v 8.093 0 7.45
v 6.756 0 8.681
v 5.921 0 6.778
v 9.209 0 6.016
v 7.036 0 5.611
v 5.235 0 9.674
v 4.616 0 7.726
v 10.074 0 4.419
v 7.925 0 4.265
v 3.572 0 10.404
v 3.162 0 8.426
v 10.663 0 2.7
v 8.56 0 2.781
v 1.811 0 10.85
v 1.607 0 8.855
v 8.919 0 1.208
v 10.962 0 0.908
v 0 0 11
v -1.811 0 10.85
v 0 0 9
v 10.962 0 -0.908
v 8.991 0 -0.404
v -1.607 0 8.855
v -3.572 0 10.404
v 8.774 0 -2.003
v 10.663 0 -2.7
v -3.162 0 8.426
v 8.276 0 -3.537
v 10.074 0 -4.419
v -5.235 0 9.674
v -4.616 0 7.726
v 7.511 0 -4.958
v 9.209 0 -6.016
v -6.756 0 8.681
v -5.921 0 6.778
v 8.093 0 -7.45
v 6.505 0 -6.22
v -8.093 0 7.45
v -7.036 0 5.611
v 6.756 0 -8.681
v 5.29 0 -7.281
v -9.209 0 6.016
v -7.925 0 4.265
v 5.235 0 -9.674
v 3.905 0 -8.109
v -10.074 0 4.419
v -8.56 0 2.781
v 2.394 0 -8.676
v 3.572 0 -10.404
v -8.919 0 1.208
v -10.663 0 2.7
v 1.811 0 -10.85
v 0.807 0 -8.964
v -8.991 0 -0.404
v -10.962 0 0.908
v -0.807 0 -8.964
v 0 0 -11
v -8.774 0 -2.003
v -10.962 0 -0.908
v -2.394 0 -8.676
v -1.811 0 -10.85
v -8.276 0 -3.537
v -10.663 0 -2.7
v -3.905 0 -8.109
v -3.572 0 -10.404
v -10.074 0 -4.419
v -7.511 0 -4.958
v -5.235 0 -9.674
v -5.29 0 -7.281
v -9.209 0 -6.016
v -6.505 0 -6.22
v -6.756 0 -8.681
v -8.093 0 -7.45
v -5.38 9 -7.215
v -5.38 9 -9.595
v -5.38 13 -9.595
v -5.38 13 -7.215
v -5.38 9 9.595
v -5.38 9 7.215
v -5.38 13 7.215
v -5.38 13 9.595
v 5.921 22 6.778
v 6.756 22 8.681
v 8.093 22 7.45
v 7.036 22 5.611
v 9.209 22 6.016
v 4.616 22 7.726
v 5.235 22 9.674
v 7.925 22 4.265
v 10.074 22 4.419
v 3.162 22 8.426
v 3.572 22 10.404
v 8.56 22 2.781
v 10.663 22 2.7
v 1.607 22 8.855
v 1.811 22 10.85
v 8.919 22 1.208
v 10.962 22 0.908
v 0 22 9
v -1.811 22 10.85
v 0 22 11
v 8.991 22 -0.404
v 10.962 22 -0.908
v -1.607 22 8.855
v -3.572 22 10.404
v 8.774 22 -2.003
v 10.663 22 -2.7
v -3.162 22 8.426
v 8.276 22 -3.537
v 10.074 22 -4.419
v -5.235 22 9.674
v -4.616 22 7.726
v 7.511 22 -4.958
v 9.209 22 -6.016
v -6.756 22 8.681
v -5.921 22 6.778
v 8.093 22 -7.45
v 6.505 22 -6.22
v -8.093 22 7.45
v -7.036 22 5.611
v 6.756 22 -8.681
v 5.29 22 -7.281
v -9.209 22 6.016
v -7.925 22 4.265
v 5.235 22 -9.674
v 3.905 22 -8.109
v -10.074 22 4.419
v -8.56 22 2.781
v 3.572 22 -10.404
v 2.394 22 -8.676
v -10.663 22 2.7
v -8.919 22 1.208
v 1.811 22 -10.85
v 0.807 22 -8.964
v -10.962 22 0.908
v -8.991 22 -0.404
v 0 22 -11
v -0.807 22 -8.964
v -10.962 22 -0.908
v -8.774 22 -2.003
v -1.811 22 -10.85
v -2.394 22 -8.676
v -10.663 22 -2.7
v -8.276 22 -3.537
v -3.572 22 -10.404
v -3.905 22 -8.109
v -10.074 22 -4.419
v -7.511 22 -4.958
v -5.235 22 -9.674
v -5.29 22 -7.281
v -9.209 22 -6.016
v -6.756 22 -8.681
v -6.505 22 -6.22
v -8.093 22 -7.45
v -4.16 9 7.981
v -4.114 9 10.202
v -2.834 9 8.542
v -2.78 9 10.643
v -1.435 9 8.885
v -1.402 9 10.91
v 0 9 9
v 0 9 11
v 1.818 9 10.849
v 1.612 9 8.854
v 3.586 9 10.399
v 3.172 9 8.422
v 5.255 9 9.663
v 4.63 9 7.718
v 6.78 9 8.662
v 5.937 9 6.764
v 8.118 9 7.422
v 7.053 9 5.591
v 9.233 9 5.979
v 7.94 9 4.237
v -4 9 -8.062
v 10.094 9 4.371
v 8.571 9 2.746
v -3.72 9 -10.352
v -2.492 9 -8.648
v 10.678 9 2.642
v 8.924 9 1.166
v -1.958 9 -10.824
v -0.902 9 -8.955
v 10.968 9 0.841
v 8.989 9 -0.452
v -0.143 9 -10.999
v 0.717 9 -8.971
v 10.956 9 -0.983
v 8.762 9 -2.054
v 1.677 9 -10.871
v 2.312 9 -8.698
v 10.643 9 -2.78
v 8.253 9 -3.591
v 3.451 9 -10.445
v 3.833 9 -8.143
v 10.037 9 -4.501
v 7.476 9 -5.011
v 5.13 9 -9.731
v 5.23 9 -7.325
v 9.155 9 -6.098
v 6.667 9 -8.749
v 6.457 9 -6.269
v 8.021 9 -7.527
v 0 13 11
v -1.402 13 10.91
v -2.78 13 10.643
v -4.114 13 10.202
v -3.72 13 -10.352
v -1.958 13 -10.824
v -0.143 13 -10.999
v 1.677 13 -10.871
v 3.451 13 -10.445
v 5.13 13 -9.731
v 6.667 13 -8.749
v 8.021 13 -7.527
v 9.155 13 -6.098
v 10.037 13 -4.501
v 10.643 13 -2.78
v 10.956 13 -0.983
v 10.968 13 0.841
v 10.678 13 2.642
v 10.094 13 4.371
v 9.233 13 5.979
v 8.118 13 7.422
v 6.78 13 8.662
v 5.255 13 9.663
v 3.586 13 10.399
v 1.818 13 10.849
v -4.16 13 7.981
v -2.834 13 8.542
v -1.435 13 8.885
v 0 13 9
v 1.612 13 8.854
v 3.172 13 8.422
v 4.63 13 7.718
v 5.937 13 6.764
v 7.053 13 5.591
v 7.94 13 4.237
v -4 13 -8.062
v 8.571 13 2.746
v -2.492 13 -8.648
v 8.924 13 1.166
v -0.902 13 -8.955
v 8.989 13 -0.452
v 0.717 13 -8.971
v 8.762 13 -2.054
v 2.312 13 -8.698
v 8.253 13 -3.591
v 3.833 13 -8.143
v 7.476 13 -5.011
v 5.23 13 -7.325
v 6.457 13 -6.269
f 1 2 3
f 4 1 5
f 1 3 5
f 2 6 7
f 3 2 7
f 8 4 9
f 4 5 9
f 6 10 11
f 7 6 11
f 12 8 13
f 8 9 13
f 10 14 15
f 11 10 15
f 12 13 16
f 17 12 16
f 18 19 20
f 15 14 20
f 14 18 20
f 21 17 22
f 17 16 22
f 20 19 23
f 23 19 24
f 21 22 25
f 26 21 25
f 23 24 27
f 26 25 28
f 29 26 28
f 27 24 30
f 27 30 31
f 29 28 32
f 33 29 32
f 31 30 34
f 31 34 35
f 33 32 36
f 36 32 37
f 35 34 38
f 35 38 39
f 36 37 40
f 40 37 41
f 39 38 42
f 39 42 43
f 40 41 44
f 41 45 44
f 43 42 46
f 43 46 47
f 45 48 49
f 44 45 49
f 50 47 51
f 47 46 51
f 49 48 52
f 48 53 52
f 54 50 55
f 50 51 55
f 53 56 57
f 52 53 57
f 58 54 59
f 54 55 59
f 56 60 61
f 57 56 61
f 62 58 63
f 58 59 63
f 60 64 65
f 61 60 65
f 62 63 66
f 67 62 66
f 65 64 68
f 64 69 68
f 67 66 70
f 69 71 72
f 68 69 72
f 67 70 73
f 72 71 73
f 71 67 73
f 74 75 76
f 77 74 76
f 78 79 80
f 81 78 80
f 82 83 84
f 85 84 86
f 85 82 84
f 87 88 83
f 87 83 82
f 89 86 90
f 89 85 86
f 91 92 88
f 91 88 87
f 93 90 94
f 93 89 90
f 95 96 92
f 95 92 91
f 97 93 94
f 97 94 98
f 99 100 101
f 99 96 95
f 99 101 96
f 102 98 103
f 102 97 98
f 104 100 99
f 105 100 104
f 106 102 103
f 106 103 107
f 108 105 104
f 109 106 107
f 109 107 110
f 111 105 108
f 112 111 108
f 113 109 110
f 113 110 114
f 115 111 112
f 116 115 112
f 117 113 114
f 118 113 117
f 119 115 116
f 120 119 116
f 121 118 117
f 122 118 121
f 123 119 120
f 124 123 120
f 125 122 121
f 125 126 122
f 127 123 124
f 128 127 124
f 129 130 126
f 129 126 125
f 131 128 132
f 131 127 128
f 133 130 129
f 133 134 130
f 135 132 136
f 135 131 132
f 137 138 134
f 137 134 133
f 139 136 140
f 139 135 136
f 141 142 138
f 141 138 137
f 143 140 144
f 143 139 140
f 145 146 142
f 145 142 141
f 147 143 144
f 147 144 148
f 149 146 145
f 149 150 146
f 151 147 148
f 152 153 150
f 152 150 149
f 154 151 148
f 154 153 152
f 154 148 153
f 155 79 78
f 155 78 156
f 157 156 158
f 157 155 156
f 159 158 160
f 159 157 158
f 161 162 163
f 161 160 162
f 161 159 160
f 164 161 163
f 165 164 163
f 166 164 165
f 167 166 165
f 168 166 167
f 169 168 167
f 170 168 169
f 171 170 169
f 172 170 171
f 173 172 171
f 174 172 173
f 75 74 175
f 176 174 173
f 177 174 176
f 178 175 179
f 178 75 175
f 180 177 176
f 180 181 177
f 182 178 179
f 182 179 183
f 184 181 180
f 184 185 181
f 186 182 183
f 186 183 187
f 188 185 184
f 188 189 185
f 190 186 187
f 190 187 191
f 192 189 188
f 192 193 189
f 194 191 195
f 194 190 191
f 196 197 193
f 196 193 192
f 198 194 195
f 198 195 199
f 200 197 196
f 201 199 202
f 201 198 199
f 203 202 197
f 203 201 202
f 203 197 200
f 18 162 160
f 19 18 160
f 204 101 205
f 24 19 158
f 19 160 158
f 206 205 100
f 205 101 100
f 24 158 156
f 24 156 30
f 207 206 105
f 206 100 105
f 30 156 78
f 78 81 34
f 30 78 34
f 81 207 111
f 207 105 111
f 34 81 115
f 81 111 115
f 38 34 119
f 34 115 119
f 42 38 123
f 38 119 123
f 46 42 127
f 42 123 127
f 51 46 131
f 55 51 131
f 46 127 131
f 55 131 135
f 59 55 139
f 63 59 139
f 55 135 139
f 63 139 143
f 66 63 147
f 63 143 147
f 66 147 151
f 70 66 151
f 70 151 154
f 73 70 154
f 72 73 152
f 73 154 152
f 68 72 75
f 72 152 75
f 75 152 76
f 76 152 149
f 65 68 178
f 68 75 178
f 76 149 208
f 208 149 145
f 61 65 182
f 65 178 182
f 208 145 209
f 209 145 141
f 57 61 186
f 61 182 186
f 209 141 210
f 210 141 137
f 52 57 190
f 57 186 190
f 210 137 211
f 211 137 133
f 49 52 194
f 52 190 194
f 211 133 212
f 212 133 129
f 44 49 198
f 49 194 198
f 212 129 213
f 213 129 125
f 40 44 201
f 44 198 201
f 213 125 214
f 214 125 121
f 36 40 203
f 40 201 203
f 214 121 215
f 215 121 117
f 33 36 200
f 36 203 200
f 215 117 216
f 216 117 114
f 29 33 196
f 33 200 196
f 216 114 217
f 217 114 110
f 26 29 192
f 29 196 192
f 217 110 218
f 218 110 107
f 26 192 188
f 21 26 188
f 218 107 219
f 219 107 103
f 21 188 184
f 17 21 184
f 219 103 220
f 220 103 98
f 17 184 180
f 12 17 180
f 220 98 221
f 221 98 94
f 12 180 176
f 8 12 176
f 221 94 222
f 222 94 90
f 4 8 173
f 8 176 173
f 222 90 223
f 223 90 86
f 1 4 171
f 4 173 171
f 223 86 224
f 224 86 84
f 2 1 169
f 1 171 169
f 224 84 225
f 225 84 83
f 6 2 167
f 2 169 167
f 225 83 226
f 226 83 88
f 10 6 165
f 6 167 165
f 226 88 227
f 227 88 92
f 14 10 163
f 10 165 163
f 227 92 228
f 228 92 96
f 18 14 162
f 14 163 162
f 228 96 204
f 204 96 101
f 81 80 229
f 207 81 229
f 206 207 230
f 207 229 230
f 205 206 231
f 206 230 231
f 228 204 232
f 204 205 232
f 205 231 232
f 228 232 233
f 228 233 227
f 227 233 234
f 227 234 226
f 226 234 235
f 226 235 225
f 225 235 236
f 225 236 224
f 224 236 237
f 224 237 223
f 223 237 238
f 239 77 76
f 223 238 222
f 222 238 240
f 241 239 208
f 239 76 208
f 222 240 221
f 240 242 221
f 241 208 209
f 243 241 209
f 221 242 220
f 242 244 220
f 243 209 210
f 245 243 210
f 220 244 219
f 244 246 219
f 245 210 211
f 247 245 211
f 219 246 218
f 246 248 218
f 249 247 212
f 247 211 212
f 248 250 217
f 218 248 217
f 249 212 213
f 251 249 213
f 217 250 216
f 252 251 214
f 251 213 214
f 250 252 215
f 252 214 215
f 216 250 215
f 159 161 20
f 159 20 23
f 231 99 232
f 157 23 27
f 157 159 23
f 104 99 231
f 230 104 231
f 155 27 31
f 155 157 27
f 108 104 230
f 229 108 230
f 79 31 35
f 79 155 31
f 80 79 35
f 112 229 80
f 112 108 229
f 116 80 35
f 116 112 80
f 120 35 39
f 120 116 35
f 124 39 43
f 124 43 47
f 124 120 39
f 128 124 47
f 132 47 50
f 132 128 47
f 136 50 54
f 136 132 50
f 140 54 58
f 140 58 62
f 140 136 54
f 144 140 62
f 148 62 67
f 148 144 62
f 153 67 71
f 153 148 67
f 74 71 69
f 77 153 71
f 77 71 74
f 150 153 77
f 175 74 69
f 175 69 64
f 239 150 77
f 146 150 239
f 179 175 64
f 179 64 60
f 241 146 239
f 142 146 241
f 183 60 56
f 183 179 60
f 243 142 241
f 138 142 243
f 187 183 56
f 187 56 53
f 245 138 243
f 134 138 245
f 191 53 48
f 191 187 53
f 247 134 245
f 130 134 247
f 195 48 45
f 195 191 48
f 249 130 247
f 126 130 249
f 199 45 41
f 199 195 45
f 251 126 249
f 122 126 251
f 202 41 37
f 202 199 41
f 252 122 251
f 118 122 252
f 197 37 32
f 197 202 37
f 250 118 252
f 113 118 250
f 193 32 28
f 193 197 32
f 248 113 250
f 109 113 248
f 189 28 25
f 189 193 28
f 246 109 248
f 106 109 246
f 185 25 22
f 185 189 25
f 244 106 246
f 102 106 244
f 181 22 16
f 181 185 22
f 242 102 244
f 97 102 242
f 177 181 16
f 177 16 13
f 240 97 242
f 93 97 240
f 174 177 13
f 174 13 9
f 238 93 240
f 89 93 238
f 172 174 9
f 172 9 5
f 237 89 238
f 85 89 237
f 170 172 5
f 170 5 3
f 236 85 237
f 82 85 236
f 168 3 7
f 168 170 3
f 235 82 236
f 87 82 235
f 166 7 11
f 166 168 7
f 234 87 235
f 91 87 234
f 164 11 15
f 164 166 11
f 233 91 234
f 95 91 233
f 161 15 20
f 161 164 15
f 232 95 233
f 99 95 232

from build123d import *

# Parameters (mm, degrees)
SKETCH_1_W               = 2
SKETCH_1_H               = 22
CUT_EXTRUDE_1_DEPTH      = 27.944387171
CUT_EXTRUDE_1_DEPTH_BACK = 27.944387171
SKETCH_2_W               = 17
SKETCH_2_H               = 4


with BuildPart() as part:
    # 草图1 → 旋转1 (revolve)
    with BuildSketch(Plane.XY, mode=Mode.PRIVATE) as revolve_1_sk:
        with Locations((10, 11)):
            Rectangle(SKETCH_1_W, SKETCH_1_H)
    revolve(revolve_1_sk.sketch.rotate(Axis((0, 25.51049322, 0), (0, -1, 0)), 90), axis=Axis((0, 25.51049322, 0), (0, -1, 0)))

    # 草图2 → 切除-拉伸1 (cut, two sides: drawn at the far end of the back side and taken through both)
    with BuildSketch(Plane.XY.offset(-CUT_EXTRUDE_1_DEPTH_BACK)):
        with Locations((3.12, 11)):
            Rectangle(SKETCH_2_W, SKETCH_2_H)
    extrude(amount=CUT_EXTRUDE_1_DEPTH + CUT_EXTRUDE_1_DEPTH_BACK, mode=Mode.SUBTRACT)


solid = part.part
